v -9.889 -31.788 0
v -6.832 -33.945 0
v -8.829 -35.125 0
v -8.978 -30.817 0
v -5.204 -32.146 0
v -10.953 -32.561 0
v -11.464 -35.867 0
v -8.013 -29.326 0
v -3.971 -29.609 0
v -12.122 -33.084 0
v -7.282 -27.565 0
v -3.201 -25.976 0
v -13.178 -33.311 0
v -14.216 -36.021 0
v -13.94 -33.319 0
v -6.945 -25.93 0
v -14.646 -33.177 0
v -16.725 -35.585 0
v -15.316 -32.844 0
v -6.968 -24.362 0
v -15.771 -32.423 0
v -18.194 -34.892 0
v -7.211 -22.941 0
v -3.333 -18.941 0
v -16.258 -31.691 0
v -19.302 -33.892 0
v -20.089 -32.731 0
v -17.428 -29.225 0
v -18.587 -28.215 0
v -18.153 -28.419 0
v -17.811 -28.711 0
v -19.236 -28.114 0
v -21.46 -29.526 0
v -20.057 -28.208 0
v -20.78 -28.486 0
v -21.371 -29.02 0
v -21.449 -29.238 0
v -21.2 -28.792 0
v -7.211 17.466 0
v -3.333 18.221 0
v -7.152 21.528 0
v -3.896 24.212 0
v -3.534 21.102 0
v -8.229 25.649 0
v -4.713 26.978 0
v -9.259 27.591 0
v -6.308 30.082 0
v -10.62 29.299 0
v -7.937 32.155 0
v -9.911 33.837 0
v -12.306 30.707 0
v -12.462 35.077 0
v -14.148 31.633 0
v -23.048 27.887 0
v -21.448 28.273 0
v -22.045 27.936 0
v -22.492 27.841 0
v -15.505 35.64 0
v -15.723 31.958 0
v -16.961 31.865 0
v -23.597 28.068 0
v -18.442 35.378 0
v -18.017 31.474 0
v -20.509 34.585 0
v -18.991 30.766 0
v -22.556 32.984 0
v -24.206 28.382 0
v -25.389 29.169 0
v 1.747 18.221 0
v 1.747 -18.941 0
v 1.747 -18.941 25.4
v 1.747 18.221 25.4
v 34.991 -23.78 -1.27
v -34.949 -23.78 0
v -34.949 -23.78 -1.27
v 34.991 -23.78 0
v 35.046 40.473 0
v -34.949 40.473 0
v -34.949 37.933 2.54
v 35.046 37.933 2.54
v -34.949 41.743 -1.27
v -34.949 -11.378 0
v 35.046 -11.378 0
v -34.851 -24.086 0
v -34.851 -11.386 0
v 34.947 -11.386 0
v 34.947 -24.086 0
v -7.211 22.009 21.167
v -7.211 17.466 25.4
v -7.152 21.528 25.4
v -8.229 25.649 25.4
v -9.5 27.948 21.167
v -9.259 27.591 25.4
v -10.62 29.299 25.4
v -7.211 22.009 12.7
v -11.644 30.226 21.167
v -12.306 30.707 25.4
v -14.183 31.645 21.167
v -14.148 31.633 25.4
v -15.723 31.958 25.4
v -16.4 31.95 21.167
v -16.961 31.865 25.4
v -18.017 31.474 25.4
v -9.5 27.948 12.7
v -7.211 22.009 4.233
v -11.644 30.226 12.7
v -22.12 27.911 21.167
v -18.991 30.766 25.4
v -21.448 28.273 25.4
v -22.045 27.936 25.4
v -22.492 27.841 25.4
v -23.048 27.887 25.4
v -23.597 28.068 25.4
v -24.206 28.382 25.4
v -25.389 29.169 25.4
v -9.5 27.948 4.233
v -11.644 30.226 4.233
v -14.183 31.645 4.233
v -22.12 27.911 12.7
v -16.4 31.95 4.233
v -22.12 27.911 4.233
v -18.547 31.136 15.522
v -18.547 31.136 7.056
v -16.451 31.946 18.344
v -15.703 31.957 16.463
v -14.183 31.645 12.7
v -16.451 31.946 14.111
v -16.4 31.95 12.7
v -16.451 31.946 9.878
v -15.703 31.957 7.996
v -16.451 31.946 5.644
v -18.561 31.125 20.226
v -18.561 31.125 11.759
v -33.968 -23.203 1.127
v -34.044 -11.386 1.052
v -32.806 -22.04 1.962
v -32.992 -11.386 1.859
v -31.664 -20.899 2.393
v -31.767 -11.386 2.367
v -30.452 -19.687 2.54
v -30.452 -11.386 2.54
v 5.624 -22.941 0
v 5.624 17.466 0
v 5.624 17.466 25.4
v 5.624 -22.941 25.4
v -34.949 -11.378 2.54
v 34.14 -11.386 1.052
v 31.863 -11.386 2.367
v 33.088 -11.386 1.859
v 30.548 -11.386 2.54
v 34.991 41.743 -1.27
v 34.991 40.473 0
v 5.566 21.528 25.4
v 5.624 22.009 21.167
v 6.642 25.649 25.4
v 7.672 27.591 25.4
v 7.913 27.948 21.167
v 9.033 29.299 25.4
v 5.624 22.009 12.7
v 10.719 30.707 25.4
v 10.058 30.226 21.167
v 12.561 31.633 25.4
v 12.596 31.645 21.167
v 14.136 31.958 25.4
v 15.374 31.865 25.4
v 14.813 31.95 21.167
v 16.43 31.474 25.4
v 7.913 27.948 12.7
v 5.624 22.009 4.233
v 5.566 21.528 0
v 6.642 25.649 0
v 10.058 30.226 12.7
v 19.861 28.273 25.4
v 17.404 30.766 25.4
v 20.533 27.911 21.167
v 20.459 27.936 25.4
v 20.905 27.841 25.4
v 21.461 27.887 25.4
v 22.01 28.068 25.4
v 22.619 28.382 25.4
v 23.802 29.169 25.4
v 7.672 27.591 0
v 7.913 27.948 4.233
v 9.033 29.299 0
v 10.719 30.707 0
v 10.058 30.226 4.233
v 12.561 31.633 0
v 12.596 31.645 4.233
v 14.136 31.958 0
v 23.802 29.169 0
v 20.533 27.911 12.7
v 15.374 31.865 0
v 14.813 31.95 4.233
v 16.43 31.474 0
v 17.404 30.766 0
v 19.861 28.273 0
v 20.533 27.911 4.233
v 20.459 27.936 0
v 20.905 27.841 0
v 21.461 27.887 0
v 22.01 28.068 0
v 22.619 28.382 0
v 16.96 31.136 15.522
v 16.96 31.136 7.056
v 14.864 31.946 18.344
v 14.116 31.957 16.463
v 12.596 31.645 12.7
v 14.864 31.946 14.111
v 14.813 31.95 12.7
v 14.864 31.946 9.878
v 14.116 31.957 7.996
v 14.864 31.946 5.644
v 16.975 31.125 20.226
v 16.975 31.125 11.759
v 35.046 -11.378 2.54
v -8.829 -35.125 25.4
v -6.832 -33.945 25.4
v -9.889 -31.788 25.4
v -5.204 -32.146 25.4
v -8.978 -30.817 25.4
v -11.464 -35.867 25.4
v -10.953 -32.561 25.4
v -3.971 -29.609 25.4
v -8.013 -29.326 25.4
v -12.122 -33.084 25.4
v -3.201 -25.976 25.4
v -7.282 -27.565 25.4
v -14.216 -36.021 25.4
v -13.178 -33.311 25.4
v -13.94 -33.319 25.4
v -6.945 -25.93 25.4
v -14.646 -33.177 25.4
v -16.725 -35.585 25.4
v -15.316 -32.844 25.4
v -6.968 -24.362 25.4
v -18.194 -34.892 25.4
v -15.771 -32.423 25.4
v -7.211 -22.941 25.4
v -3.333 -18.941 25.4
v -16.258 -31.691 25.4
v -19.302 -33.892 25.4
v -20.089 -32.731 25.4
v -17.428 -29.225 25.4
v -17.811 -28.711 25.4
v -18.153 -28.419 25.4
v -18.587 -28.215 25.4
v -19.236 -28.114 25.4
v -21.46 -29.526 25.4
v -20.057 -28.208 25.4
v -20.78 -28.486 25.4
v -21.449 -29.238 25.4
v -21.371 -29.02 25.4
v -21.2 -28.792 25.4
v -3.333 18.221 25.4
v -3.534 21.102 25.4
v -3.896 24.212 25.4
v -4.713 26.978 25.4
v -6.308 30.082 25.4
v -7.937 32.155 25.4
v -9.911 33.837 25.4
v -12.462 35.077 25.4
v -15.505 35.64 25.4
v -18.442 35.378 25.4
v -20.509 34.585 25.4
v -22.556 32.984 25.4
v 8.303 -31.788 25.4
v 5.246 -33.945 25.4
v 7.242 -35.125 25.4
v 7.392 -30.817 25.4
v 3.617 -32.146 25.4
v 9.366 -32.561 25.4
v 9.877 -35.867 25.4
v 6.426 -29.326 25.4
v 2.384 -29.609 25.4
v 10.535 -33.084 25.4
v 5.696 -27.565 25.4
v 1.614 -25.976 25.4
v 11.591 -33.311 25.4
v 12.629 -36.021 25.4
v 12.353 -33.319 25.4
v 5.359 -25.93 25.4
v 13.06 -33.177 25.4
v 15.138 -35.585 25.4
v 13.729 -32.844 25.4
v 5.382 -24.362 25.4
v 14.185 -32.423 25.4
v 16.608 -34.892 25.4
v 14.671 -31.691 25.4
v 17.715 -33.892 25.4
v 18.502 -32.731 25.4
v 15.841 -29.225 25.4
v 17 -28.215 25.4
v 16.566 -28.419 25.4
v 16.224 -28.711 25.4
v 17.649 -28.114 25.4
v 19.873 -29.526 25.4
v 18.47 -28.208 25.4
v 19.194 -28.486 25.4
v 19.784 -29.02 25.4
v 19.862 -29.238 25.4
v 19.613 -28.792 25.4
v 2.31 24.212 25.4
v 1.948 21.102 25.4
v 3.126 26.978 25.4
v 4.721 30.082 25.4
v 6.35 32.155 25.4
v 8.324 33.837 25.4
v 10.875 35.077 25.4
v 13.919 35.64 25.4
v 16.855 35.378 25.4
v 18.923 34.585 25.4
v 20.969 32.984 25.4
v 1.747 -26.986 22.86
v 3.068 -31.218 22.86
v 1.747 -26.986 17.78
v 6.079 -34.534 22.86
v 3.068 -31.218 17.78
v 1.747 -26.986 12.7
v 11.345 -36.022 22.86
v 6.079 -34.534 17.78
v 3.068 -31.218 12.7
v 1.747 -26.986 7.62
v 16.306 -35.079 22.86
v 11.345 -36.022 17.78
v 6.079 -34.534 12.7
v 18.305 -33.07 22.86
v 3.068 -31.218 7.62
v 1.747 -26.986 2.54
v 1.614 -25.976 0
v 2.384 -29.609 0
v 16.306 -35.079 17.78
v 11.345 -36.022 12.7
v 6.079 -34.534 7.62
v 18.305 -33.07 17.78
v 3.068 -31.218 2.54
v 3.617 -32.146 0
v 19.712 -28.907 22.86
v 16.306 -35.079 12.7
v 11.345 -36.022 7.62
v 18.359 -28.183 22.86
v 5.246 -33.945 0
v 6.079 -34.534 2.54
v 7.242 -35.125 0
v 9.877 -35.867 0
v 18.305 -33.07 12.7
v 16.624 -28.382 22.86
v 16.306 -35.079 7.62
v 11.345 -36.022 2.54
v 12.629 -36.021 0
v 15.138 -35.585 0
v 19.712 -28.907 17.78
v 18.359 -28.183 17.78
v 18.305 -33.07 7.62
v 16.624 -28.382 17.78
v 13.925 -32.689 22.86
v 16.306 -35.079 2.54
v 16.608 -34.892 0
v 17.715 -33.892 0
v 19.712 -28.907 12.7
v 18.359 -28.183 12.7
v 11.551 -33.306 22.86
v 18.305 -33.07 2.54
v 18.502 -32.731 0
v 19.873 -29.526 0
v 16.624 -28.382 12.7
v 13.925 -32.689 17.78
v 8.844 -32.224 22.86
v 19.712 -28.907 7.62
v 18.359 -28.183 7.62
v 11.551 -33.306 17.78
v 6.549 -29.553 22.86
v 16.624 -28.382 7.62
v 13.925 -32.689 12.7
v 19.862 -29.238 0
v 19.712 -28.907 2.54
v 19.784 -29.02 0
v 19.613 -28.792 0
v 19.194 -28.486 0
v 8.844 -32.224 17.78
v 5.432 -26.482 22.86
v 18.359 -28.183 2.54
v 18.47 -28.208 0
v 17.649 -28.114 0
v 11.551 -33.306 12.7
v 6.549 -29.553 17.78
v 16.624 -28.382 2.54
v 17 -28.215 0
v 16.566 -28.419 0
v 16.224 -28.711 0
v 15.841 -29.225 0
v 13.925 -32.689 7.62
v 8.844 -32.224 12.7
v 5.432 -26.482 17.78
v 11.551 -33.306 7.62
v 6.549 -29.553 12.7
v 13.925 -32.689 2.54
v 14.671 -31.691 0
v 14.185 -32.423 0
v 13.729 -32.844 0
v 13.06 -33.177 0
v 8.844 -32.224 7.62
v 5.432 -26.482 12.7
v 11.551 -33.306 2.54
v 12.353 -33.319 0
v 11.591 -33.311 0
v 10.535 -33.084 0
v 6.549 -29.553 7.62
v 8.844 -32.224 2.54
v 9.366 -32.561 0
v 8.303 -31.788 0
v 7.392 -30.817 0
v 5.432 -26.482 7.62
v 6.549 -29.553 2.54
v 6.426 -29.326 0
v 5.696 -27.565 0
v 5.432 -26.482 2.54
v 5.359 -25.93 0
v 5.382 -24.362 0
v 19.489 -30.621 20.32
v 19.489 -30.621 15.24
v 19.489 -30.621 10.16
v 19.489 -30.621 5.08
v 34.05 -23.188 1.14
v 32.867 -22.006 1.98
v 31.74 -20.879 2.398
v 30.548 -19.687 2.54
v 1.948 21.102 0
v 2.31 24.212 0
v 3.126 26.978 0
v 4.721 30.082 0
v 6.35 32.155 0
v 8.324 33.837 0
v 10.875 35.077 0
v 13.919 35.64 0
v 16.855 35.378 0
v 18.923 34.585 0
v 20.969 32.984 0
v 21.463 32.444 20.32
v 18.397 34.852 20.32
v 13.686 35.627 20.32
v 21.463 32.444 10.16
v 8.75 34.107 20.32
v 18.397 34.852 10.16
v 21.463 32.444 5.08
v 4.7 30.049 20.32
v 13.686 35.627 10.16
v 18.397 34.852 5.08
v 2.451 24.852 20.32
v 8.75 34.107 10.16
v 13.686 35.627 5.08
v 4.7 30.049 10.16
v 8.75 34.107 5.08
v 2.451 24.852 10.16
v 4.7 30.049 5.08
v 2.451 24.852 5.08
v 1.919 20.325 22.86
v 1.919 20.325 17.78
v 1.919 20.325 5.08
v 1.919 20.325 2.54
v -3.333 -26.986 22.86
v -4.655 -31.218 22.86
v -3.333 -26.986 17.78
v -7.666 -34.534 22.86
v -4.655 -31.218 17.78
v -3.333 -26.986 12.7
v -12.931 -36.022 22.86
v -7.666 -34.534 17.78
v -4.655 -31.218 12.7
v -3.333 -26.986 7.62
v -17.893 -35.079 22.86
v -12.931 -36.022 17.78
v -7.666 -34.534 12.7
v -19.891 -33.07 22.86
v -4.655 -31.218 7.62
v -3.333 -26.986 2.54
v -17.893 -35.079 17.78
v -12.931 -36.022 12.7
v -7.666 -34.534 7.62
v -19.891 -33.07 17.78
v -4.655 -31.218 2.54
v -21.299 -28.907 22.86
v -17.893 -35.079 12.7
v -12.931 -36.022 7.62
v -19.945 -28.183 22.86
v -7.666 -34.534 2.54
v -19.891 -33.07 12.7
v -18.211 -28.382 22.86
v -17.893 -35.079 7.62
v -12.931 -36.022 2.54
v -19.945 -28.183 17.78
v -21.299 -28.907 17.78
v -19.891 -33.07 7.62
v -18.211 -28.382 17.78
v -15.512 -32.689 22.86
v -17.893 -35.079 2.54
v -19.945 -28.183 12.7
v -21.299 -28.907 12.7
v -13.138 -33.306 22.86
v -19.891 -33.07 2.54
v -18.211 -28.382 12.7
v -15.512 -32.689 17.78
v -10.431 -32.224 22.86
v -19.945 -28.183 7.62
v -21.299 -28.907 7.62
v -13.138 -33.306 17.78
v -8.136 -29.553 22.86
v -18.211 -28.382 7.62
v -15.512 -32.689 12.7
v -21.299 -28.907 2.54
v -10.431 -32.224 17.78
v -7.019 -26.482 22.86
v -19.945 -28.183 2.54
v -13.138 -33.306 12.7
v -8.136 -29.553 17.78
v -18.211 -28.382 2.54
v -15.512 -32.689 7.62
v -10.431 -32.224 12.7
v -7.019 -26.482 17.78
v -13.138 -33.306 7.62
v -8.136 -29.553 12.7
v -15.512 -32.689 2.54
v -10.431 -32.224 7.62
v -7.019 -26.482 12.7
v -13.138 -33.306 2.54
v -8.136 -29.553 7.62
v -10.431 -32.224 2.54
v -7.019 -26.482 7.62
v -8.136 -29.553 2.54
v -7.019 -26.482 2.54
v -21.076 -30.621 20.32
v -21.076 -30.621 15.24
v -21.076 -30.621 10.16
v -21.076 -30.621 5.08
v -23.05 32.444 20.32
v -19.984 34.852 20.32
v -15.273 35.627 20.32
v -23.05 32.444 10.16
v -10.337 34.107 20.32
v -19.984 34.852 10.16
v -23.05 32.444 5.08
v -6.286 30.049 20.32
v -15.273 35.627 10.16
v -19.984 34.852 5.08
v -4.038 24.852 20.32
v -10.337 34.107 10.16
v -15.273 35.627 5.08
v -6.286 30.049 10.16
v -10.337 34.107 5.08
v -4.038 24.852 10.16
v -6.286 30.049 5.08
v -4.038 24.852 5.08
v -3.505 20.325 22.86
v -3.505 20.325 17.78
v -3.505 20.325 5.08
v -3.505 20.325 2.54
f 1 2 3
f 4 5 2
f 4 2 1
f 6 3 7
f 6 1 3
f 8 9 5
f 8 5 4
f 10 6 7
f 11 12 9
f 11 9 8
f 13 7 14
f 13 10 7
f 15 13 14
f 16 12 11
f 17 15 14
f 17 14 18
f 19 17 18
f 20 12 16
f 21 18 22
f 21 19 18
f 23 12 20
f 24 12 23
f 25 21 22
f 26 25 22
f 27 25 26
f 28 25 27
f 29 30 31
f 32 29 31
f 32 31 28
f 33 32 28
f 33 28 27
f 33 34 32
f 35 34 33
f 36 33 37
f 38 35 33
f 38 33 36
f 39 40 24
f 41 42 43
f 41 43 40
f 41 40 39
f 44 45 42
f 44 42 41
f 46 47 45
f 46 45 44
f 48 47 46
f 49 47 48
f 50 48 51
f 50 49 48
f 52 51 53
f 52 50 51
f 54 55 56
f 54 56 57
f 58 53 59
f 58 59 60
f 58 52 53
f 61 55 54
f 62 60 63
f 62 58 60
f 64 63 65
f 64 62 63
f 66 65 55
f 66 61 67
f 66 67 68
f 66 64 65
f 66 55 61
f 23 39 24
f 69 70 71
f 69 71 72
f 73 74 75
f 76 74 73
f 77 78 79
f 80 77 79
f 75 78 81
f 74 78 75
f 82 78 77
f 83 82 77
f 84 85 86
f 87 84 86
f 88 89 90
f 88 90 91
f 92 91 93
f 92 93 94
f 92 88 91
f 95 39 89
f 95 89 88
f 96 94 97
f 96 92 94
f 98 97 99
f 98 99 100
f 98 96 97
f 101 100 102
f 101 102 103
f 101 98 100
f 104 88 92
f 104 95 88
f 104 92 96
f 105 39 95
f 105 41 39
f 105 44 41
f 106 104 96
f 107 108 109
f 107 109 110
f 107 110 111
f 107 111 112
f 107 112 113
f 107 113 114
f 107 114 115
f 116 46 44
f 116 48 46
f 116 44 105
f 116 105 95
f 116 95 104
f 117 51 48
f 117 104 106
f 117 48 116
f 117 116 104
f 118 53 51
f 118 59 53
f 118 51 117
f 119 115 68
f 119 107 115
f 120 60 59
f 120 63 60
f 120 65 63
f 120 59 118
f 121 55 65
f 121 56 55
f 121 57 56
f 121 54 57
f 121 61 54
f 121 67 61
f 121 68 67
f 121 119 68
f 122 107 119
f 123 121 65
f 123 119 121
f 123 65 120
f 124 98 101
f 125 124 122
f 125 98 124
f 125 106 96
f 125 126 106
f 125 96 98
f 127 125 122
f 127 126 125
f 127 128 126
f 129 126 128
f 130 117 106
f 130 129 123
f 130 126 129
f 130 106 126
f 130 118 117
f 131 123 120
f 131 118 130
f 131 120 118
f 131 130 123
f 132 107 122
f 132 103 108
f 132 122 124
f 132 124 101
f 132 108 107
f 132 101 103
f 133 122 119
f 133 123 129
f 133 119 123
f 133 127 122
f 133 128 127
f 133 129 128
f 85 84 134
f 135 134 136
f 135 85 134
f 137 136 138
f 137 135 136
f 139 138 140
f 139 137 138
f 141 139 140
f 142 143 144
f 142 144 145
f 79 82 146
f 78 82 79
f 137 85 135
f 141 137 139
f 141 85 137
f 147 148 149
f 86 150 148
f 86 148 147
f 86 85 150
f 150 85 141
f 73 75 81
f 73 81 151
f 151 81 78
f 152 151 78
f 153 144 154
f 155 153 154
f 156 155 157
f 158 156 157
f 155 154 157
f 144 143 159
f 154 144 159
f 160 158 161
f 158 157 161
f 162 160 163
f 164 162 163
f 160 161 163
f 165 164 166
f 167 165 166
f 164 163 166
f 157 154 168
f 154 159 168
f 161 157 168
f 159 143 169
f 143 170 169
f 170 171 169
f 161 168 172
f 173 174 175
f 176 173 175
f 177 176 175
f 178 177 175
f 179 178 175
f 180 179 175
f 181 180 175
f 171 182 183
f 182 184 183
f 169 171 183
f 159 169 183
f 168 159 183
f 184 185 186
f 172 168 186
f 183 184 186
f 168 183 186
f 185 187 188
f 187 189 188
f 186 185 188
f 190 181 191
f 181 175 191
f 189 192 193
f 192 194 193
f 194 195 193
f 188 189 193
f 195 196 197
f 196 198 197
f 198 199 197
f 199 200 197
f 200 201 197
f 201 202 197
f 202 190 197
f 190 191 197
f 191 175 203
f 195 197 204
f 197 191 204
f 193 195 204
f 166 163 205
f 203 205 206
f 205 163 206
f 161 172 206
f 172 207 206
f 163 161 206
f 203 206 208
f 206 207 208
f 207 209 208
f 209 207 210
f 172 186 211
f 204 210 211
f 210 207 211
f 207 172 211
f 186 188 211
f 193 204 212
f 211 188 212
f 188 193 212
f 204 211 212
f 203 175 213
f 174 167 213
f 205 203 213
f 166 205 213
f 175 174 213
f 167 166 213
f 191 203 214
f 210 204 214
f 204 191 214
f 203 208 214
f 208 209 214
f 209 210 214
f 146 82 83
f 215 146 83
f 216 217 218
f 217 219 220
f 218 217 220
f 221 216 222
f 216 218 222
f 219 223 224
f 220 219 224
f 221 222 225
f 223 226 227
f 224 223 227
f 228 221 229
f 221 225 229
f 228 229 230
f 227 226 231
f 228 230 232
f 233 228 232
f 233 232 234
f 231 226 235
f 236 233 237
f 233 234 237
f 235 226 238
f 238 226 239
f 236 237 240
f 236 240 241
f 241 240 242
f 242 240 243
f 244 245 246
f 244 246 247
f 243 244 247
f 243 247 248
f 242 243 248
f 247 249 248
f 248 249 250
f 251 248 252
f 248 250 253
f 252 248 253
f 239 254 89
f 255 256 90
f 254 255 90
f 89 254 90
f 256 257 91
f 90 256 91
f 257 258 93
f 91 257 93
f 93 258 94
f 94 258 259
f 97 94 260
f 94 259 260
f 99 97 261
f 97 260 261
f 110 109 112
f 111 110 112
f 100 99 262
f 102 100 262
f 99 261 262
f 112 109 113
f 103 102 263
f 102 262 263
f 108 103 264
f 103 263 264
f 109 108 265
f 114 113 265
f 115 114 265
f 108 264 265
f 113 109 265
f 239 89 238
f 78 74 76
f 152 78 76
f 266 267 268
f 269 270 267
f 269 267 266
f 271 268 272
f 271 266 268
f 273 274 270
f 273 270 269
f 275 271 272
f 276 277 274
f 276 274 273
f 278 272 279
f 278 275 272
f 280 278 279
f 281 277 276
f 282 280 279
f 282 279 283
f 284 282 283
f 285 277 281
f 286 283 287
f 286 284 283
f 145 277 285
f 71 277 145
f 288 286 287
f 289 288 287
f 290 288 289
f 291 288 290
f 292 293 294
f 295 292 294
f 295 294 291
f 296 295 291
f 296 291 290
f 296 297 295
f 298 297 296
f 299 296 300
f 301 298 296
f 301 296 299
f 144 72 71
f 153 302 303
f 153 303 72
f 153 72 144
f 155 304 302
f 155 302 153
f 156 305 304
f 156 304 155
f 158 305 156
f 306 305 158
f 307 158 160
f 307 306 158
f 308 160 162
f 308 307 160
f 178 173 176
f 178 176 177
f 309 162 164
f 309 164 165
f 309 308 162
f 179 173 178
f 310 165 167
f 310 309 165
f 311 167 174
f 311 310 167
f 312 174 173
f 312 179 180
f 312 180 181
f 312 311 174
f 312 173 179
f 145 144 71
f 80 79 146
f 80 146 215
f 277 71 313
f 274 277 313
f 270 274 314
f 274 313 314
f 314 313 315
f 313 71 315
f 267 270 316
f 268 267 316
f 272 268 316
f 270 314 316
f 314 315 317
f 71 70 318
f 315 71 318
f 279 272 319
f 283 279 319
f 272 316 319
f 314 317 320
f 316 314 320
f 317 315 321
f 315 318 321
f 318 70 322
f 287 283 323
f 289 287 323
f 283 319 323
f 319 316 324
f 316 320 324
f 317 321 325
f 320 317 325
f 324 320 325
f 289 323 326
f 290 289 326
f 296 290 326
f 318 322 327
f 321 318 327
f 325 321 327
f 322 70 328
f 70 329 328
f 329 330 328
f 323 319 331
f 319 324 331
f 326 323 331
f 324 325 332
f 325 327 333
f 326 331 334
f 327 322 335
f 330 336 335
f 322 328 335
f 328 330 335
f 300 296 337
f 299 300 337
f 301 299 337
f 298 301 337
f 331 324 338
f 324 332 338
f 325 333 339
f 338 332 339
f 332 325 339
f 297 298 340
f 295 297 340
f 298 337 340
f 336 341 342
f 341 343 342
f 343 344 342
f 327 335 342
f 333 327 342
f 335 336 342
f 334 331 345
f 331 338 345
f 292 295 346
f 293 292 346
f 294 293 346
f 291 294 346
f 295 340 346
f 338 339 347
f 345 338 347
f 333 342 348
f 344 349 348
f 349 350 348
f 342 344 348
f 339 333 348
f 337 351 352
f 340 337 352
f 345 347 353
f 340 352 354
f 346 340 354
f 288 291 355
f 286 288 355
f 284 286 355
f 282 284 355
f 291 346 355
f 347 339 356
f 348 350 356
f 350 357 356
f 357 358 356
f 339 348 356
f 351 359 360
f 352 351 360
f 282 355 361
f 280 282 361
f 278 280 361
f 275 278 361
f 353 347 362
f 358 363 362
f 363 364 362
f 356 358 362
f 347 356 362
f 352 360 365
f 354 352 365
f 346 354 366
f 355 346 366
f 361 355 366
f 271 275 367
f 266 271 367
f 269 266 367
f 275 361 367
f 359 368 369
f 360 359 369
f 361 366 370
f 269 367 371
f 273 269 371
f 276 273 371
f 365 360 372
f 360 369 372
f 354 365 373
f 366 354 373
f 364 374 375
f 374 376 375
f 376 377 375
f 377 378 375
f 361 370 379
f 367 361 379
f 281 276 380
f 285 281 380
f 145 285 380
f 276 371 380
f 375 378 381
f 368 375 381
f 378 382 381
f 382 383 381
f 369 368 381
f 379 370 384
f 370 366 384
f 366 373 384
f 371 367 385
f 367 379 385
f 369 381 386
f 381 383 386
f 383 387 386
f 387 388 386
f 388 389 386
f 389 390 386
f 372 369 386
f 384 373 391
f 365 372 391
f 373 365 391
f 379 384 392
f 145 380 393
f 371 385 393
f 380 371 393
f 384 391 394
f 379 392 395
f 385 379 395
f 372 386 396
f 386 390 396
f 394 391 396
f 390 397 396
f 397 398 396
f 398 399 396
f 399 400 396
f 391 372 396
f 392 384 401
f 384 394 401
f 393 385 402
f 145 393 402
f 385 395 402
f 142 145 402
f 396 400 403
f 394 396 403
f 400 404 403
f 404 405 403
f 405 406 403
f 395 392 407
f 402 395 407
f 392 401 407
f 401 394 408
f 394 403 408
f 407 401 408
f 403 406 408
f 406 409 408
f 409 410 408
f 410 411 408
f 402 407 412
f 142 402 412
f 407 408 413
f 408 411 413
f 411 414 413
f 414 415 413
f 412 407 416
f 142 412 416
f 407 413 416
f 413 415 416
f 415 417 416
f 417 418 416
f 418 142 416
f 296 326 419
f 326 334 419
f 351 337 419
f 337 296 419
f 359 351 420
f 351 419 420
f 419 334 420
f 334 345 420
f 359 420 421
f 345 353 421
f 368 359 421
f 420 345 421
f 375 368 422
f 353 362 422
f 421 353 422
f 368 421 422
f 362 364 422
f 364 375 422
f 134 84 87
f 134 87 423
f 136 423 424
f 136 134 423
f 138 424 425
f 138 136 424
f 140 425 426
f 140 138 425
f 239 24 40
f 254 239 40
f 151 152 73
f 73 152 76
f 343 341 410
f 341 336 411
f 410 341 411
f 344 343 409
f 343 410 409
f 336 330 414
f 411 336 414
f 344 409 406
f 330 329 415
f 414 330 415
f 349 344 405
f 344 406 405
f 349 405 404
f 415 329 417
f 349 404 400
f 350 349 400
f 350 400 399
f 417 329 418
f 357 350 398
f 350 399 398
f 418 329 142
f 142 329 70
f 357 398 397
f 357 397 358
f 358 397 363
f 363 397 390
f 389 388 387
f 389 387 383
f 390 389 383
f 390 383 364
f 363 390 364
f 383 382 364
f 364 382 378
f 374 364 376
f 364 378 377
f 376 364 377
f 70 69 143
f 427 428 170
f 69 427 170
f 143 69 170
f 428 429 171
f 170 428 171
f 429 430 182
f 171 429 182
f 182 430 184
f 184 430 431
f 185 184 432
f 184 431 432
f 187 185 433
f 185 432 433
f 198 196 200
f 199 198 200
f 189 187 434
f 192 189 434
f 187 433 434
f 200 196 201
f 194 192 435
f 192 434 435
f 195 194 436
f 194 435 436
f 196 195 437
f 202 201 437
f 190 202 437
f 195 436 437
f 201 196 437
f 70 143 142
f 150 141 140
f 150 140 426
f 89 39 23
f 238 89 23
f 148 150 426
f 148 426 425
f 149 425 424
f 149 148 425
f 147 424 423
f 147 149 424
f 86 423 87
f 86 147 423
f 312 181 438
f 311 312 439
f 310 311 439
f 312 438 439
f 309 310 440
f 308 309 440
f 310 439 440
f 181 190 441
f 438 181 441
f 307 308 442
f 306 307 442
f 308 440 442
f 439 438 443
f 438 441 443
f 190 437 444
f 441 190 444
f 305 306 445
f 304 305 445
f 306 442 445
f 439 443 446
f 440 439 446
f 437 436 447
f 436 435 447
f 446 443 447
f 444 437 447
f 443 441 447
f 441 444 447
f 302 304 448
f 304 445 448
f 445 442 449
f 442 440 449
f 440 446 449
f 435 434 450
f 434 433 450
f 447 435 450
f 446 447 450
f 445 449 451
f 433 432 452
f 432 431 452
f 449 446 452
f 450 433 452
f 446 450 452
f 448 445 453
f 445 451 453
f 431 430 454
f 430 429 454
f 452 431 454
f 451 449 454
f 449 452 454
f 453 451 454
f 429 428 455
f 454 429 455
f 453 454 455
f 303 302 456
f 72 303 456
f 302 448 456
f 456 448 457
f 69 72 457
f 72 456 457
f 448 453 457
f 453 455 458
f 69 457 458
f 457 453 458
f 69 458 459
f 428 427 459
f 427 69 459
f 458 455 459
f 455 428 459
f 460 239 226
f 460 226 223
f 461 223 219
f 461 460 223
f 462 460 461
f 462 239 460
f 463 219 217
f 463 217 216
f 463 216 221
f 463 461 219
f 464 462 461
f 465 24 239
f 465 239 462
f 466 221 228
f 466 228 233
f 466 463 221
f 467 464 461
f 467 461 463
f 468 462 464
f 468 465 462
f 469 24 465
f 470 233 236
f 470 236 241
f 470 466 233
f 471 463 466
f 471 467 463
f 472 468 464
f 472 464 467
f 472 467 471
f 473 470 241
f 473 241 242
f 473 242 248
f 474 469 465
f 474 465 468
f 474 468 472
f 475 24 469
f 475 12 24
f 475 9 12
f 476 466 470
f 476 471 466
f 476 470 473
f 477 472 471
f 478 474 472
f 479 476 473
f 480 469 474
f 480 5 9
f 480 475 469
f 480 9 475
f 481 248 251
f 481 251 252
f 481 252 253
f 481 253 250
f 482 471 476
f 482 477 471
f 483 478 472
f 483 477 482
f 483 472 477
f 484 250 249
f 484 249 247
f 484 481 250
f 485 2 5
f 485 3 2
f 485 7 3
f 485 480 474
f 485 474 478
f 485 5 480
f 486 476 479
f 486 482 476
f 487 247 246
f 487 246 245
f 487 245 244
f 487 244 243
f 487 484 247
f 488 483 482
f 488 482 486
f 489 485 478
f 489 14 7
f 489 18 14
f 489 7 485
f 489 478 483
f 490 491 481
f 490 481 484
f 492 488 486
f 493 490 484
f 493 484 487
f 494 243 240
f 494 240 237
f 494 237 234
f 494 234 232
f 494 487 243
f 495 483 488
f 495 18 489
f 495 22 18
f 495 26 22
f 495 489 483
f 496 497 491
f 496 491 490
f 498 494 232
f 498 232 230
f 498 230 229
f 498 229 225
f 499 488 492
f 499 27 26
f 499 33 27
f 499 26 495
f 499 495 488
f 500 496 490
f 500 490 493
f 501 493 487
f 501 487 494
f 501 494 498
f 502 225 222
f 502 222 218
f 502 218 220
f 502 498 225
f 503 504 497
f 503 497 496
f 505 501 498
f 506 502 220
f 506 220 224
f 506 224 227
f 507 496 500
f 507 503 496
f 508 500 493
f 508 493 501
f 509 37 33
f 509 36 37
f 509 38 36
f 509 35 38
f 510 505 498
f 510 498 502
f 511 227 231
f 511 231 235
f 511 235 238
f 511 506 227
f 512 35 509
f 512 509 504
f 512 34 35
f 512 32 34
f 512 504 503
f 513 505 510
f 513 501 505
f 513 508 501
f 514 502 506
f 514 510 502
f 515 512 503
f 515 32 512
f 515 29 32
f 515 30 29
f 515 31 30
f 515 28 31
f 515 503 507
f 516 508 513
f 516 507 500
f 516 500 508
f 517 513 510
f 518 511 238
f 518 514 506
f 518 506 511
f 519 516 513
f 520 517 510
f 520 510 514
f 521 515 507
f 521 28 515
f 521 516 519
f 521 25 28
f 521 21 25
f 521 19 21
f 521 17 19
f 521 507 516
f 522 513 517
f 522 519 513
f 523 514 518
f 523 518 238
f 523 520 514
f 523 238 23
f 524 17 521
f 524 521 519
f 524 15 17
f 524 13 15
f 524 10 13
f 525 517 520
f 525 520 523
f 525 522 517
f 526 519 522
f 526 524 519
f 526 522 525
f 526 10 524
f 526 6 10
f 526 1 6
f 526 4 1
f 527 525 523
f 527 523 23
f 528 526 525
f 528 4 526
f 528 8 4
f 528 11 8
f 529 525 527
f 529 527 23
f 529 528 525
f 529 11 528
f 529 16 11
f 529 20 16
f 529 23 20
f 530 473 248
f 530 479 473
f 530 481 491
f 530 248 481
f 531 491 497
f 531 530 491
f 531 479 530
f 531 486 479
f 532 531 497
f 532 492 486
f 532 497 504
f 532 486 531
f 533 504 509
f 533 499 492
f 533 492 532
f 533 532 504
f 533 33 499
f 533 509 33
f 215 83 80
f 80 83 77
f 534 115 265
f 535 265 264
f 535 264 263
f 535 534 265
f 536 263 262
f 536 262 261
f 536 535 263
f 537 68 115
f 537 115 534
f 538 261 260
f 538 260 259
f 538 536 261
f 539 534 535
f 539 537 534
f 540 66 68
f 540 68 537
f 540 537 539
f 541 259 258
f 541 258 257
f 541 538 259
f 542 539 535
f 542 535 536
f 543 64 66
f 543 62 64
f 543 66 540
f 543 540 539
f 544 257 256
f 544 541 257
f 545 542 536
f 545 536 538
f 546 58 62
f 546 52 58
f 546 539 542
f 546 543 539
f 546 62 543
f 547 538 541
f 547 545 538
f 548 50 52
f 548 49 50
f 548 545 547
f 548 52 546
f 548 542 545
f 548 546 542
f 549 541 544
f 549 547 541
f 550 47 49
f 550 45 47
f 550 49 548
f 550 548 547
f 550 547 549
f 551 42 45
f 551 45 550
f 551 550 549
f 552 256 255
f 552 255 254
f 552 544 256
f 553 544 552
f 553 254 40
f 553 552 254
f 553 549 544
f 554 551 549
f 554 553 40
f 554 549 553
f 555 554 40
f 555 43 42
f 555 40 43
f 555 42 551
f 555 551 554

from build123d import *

# Parameters (mm, degrees)
F1_DEPTH     = 25.4
F4_W         = 69.7987195548
F4_H         = 12.7
F5_DEPTH     = 2.54
F6_T1_DEPTH  = 91.7957648109
F7_T1_DEPTH  = 30.2976362049
F8_T1_DEPTH  = 30.2976362049
F9_W         = 69.9951983988
F9_H         = 56.9309936836
F10_DEPTH    = 2.54
F11_W        = 69.9400268495
F11_H        = 66.7930708891
F12_DEPTH    = 1.27
F13_T1_DEPTH = 109.1876471354
F14_T1_DEPTH = 83.0041764284


# Not quite as in the source:
# - a fillet or chamfer that OpenCascade refuses, or shapes differently, is made with other operations: its cross-section is extruded or revolved along the edge and cut away or added


with BuildPart() as f1:
    # F0 (on Top) → F1 (new body)
    with BuildSketch(Plane.XY):
        with BuildLine():
            add(Edge.make_bspline(
                [(-25.3892242908, 29.1687585413), (-23.9101314013, 31.4486866753), (-20.7881663251, 36.2609983704), (-9.1463899399, 35.7254461506), (-3.2777537007, 25.5380991998), (-3.5742881653, 19.1688234613), (-3.3841941276, 18.4209676857), (-3.3333937172, 18.2211119682)],
                knots=[0, 0, 0, 0, 0.2228253831, 0.4703241216, 0.7365451299, 0.9295947644, 1, 1, 1, 1], degree=3))
            add(Edge.make_bspline(
                [(-7.2106076404, 17.4659974873), (-7.0960839892, 18.9182648401), (-6.8460158254, 22.0893637897), (-8.9625216947, 28.2814027293), (-13.8811242457, 32.206810347), (-18.8078127809, 32.0506891323), (-21.8172896516, 26.6531796951), (-24.2679202869, 28.3790664228), (-25.3892242908, 29.1687585413)],
                knots=[0, 0, 0, 0, 0.1607433504, 0.3509912061, 0.535196632, 0.6915441839, 0.8588637812, 1, 1, 1, 1], degree=3))
            Line((-7.2106076404, 17.4659974873), (-7.2106076404, -22.9408182204))
            add(Edge.make_bspline(
                [(-3.3333937172, -18.9407765865), (-3.1142473062, -21.5798728563), (-2.6671599952, -26.9639740582), (-6.2224863176, -36.1495419675), (-18.7613568768, -36.6643913981), (-20.7940116277, -31.023866226), (-22.1012345625, -28.6408761942), (-17.1327960007, -27.1867369593), (-16.4969316925, -34.1062525933), (-9.5670200889, -33.0225376657), (-6.484504483, -26.5775936324), (-6.9952909898, -24.0192576859), (-7.2106076404, -22.9408182204)],
                knots=[0, 0, 0, 0, 0.1210737943, 0.2470063593, 0.3836118826, 0.4813711357, 0.5410941326, 0.6166345084, 0.7128727302, 0.8092971236, 0.919611219, 1, 1, 1, 1], degree=3))
            Line((-3.3333937172, -18.9407765865), (-3.3333937172, 18.2211119682))
        make_face()
    extrude(amount=F1_DEPTH)


with BuildPart() as f3_1:
    # F3: instance of F1
    add(f1.part.mirror(Plane(origin=(-0.7933937172, -0.3598323092, 12.7), x_dir=(0, 1, 0), z_dir=(1, 0, 0))))


with BuildPart() as f5:
    # F4 (on Top) → F5 (new body)
    with BuildSketch(Plane.XY):
        with Locations((0.0479891896, -17.7361853421)):
            Rectangle(F4_W, F4_H)
    extrude(amount=F5_DEPTH)

    # F6: fillet of radius 5.08 on 1 edges, made by hand

    # F6_s2 → F6_t1 (cut)
    with BuildSketch(Plane.YZ.offset(-45.8498932158)):
        with BuildLine():
            ThreePointArc((-24.0861853421, 0), (-22.2267762908, 1.8594090512), (-19.6867762908, 2.54))
            Line((-19.6867762908, 2.54), (-24.0861853421, 2.54))
            Line((-24.0861853421, 2.54), (-24.0861853421, 0))
        make_face()
    extrude(amount=F6_T1_DEPTH, mode=Mode.SUBTRACT)

    # F7: fillet of radius 5.08 on 1 edges, made by hand

    # F7_s2 → F7_t1 (cut)
    with BuildSketch(Plane.XZ.offset(0.387662714)):
        with BuildLine():
            ThreePointArc((-34.8513705878, 0), (-32.9919615365, 1.8594090512), (-30.4519615365, 2.54))
            Line((-30.4519615365, 2.54), (-34.8513705878, 2.54))
            Line((-34.8513705878, 2.54), (-34.8513705878, 0))
        make_face()
    extrude(amount=F7_T1_DEPTH, mode=Mode.SUBTRACT)

    # F8: fillet of radius 5.08 on 1 edges, made by hand

    # F8_s2 → F8_t1 (cut)
    with BuildSketch(Plane.XZ.offset(0.387662714)):
        with BuildLine():
            ThreePointArc((30.5479399158, 2.54), (33.0879399158, 1.8594090512), (34.947348967, 0))
            Line((34.947348967, 0), (34.947348967, 2.54))
            Line((34.947348967, 2.54), (30.5479399158, 2.54))
        make_face()
    extrude(amount=F8_T1_DEPTH, mode=Mode.SUBTRACT)


with BuildPart() as f10:
    # F9 (on Top) → F10 (new body)
    with BuildSketch(Plane.XY):
        with Locations((0.0482033938, 17.0871145092)):
            Rectangle(F9_W, F9_H)
    extrude(amount=F10_DEPTH)

    # F13: chamfer of 7.62 on 1 edges, made by hand

    # F13_s2 → F13_t1 (cut)
    with BuildSketch(Plane.YZ.offset(-54.5456201739)):
        Polygon((45.552611351, -5.08), (37.932611351, 2.54), (45.552611351, 2.54), align=None)
    extrude(amount=F13_T1_DEPTH, mode=Mode.SUBTRACT)


with BuildPart() as f12:
    # F11 (on face) → F12 (new body)
    with BuildSketch(Plane(origin=(0, 0, 0), x_dir=(1, 0, 0), z_dir=(0, 0, -1))):
        with Locations((0.0206176192, -9.6160759065)):
            Rectangle(F11_W, F11_H)
    extrude(amount=F12_DEPTH)

    # F14: chamfer of 2.54 on 1 edges, made by hand

    # F14_s2 → F14_t1 (cut)
    with BuildSketch(Plane.YZ.offset(-41.481470595)):
        Polygon((43.012611351, -2.54), (40.472611351, 0), (43.012611351, 0), align=None)
    extrude(amount=F14_T1_DEPTH, mode=Mode.SUBTRACT)


solid = Compound([f1.part, f3_1.part, f5.part, f10.part, f12.part])
